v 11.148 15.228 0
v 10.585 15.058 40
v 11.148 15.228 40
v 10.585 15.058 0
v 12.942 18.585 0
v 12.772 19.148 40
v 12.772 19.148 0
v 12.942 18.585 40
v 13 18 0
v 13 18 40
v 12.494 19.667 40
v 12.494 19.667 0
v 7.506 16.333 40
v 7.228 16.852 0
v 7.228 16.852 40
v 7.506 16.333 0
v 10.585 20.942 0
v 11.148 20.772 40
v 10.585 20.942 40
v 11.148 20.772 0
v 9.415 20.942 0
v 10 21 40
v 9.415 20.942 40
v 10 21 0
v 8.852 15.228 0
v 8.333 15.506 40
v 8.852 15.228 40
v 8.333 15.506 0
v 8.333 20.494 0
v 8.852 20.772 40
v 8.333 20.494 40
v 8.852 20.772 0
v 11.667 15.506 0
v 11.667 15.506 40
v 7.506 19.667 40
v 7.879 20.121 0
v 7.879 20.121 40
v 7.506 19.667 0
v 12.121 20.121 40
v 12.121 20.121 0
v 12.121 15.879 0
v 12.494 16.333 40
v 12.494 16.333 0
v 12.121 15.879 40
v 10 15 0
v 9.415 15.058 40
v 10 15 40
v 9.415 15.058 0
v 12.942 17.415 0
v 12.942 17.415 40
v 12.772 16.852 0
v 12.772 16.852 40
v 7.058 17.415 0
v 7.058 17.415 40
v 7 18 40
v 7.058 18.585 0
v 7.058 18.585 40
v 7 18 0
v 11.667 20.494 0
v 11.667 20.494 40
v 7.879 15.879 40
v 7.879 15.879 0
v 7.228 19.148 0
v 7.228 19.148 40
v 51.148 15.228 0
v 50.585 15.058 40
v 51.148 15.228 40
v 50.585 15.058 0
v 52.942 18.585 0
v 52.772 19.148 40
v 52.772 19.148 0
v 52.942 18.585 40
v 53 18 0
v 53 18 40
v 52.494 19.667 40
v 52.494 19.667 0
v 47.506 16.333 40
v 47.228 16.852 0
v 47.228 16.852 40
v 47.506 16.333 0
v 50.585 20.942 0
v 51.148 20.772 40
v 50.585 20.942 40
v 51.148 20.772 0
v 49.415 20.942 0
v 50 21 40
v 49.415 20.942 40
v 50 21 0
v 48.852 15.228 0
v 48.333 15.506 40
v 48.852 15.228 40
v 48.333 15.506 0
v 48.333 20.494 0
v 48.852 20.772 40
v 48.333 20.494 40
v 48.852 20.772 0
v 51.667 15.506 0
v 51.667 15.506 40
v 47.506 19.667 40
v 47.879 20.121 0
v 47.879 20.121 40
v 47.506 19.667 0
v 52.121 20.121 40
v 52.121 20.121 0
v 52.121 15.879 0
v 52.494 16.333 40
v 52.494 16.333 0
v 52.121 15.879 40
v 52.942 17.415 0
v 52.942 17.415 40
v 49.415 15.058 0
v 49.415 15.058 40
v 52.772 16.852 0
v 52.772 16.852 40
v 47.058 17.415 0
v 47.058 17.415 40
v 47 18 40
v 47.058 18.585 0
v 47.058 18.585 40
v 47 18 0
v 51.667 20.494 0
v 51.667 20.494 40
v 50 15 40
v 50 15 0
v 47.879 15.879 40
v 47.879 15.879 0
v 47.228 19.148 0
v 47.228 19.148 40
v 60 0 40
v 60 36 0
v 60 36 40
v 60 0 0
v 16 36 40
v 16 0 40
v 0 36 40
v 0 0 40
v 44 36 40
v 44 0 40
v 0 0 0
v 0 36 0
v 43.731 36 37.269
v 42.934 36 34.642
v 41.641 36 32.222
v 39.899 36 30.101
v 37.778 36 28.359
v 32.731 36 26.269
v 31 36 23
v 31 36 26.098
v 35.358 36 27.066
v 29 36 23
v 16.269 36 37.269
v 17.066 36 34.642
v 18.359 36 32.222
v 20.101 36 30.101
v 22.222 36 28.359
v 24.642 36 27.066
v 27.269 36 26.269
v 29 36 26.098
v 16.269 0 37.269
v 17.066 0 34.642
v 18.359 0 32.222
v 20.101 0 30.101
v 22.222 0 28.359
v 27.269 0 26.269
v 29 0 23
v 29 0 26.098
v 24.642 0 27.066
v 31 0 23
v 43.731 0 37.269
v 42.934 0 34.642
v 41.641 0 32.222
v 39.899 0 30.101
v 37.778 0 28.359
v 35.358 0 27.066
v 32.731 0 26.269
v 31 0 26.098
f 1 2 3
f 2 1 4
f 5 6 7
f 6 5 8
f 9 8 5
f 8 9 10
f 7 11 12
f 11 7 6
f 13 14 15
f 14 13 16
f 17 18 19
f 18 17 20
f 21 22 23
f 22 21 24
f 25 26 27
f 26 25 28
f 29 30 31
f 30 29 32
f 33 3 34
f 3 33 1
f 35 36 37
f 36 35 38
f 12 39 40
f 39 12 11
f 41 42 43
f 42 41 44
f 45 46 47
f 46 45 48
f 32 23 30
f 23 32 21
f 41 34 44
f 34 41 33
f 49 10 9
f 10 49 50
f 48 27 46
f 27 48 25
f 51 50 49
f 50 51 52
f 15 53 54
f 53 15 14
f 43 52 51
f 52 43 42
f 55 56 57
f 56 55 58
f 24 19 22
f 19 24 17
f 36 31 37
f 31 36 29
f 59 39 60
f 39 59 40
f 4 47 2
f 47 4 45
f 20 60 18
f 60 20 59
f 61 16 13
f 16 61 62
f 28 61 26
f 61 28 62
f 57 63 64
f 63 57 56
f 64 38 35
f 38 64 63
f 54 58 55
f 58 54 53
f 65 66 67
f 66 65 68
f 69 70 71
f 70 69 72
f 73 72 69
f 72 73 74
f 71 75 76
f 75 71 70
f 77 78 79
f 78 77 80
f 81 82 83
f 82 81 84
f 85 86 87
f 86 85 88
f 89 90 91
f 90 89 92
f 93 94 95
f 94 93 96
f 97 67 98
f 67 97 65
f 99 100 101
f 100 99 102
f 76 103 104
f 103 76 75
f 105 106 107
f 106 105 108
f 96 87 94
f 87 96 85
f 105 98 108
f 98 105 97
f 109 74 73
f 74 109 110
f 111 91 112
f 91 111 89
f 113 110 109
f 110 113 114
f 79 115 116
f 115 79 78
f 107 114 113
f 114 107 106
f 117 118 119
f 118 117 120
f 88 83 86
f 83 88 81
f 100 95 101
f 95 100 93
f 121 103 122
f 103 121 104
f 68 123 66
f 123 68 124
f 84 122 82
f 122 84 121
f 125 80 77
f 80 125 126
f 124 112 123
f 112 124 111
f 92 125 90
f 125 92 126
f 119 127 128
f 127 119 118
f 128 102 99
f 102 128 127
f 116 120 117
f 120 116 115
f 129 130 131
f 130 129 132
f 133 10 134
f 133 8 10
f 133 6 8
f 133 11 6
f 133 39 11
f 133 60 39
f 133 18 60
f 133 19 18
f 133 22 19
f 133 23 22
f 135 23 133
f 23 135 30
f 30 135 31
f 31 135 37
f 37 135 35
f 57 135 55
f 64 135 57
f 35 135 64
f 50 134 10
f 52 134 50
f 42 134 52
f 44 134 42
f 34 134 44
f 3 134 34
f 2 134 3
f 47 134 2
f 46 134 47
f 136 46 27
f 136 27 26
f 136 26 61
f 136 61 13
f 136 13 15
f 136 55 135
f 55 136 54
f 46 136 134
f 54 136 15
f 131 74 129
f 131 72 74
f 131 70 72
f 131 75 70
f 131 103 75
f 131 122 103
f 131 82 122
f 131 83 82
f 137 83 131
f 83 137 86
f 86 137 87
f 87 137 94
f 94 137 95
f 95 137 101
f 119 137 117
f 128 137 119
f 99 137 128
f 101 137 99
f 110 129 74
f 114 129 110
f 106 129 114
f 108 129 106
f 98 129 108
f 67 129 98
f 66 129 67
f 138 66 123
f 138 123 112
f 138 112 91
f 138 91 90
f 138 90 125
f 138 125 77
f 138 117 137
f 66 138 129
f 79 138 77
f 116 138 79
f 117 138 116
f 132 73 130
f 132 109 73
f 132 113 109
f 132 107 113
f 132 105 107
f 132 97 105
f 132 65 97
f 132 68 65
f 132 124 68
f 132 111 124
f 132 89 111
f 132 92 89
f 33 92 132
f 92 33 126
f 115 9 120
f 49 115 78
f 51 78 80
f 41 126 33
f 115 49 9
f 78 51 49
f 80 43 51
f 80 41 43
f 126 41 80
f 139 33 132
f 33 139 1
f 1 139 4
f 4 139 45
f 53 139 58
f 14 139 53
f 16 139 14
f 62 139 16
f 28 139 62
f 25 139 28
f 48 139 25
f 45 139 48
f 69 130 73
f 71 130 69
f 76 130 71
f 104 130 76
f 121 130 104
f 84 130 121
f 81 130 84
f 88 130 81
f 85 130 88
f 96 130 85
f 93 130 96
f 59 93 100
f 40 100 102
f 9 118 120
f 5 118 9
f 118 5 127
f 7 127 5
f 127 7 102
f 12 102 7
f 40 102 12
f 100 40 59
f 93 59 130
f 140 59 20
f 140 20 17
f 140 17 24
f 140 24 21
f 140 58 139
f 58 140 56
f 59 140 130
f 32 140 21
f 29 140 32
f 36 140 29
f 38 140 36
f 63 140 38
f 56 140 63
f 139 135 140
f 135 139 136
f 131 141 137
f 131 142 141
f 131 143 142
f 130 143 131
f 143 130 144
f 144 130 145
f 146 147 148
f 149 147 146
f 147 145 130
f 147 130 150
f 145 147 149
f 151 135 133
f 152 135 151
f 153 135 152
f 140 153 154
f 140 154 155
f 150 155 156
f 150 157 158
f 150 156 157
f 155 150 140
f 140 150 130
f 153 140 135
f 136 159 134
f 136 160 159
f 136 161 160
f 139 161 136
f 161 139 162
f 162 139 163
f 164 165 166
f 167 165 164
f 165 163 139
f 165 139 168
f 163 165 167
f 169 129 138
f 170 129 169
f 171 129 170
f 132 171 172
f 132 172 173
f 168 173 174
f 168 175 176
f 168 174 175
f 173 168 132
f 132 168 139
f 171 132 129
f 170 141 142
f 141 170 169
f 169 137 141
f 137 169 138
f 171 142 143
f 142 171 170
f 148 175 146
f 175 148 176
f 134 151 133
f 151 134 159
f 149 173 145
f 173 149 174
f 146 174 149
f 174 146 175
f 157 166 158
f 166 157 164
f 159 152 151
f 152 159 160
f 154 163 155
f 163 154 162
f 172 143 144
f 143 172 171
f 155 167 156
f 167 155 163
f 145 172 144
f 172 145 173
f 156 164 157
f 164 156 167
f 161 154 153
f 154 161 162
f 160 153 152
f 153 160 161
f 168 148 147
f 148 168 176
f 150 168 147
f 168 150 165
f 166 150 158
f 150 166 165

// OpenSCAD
$fn = 32;

// ----------------------------------------------------------------------
// Saddle clamp: split shaft clamp
// ----------------------------------------------------------------------

// --- parameters (mm) ---
blk_l = 60;               // block length, X
blk_w = 36;               // block width, Y
blk_h = 40;               // block height
clamp_r = 14;             // shaft groove radius
hole_r = 3;               // bolt hole radius
hole_m = 10;              // bolt hole margin from the ends
saw_w = 2;                // saw kerf width

saw_depth = clamp_r + 3;  // saw kerf depth

difference() {
  cube([blk_l, blk_w, blk_h]);
  translate([blk_l / 2, -1, blk_h])
    rotate([-90, 0, 0])
      cylinder(h = blk_w + 2, r = clamp_r);
  for (sx = [0, 1])
    translate([sx ? blk_l - hole_m : hole_m, blk_w / 2, -1])
      cylinder(r = hole_r, h = blk_h + 2);
  translate([blk_l / 2 - saw_w / 2, -1, blk_h - saw_depth])
    cube([saw_w, blk_w + 2, saw_depth + 1]);
}
